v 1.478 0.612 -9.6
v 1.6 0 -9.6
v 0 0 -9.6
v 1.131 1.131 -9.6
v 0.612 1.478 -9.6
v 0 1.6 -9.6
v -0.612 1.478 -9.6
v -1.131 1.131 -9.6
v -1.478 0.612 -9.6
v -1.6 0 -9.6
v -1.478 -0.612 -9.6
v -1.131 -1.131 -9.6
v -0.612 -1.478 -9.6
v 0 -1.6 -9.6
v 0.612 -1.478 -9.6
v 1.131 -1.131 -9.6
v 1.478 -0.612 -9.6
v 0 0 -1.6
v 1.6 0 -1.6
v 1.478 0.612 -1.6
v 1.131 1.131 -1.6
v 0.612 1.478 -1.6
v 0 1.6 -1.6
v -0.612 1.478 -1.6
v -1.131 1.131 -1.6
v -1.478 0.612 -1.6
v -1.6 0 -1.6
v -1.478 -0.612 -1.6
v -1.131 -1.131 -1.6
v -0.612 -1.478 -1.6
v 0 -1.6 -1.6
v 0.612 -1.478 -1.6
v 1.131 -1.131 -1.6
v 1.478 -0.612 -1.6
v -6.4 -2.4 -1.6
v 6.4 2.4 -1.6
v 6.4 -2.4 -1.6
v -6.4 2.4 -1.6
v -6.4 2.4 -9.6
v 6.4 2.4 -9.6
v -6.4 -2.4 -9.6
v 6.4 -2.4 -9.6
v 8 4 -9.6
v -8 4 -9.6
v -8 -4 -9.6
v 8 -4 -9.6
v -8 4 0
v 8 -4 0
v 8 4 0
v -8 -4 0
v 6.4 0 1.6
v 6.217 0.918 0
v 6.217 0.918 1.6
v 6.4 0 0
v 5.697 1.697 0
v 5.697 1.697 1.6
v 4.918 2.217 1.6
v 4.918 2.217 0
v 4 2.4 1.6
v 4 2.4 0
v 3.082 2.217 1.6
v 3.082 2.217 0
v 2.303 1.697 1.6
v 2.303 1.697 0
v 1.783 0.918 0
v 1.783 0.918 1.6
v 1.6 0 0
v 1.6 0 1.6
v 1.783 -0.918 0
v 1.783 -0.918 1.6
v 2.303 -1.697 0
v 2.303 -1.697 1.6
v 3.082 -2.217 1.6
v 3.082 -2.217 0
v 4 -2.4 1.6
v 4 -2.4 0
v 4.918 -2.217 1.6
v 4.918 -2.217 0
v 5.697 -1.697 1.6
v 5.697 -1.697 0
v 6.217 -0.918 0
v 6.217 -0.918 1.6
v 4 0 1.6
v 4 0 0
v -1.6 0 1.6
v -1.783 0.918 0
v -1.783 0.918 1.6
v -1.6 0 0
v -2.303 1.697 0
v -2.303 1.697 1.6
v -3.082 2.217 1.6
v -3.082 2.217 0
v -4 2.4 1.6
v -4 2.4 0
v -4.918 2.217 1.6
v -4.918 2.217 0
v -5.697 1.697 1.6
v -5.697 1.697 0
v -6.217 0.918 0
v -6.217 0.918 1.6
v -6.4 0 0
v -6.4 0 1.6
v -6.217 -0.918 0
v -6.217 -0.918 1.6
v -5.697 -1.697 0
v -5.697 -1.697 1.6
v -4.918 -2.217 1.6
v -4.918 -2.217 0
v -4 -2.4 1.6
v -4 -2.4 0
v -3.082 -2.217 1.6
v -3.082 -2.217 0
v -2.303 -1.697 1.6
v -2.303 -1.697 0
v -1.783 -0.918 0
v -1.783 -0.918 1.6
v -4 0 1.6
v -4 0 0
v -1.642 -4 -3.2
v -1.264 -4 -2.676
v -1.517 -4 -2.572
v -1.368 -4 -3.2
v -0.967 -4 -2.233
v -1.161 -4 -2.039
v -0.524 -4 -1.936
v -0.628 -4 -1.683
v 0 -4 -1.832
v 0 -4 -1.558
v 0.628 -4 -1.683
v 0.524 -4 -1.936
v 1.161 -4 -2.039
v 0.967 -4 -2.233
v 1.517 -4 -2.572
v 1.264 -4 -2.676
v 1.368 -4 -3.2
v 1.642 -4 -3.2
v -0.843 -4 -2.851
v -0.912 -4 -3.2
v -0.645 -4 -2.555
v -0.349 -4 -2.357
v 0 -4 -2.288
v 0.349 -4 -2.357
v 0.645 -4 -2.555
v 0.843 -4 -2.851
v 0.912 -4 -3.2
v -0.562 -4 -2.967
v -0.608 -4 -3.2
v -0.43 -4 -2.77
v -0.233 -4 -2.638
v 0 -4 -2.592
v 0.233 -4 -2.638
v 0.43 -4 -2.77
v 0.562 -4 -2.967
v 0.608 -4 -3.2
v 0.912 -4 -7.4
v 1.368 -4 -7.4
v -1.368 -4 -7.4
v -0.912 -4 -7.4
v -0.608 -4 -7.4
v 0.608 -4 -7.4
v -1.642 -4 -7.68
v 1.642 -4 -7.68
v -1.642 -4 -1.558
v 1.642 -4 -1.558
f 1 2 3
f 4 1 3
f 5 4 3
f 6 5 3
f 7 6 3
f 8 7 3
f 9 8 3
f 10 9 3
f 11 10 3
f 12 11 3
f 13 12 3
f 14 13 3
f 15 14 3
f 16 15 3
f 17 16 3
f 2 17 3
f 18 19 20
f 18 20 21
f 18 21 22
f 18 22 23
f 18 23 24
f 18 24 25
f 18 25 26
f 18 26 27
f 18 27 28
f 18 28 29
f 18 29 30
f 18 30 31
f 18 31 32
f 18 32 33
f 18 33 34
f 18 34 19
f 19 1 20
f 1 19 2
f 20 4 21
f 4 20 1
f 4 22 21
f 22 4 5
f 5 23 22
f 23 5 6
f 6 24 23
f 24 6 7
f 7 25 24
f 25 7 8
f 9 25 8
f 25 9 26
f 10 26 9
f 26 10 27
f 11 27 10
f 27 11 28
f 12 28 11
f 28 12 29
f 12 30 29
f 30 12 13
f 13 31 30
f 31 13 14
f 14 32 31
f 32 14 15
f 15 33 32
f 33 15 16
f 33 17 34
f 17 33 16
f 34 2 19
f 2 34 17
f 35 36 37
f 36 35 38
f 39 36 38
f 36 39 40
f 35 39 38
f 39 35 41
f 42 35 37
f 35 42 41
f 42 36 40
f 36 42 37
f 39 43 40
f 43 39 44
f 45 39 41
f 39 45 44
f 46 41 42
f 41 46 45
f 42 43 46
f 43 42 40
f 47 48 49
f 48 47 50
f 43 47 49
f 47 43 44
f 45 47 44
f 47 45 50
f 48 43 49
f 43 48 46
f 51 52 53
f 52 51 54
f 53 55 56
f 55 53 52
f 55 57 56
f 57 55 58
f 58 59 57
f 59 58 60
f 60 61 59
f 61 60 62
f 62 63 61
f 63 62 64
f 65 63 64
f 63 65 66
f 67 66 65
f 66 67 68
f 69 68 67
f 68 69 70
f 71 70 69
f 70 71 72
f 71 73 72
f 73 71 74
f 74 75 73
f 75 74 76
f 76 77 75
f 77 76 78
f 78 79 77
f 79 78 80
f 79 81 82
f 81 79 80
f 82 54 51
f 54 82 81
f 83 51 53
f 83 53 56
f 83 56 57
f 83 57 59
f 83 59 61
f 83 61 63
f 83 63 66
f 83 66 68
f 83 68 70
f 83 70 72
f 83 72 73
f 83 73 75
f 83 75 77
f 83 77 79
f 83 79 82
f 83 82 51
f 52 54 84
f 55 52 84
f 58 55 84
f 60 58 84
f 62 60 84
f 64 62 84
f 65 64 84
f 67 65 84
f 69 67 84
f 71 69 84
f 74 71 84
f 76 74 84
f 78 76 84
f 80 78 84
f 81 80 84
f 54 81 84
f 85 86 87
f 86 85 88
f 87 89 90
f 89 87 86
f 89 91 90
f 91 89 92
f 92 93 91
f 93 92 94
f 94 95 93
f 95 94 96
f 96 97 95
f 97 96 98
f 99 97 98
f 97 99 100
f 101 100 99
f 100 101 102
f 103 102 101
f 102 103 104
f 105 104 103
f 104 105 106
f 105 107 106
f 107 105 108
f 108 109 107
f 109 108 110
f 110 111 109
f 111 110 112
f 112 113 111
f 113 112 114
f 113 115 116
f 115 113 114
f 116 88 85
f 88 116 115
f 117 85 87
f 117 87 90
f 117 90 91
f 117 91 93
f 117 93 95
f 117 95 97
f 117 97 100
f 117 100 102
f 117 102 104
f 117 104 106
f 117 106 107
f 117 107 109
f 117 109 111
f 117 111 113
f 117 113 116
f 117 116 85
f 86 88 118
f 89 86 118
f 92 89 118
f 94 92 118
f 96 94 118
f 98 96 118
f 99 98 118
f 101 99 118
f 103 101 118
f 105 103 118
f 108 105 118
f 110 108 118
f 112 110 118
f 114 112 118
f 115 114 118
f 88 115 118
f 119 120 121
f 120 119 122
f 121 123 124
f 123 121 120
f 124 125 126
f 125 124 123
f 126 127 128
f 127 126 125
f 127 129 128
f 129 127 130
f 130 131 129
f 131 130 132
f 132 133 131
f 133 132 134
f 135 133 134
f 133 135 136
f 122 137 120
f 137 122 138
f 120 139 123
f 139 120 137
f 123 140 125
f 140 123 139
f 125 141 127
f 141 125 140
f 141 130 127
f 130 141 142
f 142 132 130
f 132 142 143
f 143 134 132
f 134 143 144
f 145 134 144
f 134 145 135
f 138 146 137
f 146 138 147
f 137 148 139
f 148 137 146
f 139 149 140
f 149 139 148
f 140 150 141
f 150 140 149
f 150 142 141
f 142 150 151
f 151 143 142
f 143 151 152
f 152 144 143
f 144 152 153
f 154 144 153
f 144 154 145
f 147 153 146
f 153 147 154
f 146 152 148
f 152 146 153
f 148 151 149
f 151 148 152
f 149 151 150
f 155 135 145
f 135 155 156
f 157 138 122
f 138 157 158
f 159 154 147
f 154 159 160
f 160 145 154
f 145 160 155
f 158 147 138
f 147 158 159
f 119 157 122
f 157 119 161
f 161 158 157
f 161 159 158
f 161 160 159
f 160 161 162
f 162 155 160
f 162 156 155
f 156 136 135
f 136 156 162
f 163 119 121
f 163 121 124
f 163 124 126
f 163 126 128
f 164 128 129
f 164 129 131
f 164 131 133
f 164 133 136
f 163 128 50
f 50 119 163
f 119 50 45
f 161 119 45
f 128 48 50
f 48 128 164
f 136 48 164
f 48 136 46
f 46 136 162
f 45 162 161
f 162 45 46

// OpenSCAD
// file: ../p/4-4edge.scad
use <../lib.scad>
function ldraw_lib__4_4edge() = [
// 0 Circle 1.0
// 0 Name: 4-4edge.dat
// 0 Author: James Jessiman
// 0 !LDRAW_ORG Primitive UPDATE 2017-01
// 0 !LICENSE Licensed under CC BY 2.0 and CC BY 4.0 : see CAreadme.txt
// 
// 0 BFC CERTIFY CCW
  [0,"BFC","CERTIFY"],
  [0,"BFC","CCW"],
// 
// 0 !HISTORY 1998-12-15 [PTadmin] Official Update 1998-10
// 0 !HISTORY 2005-12-28 [PTadmin] Official Update 2005-01
// 0 !HISTORY 2007-06-24 [PTadmin] Header formatted for Contributor Agreement
// 0 !HISTORY 2008-07-01 [PTadmin] Official Update 2008-01
// 0 !HISTORY 2017-01-15 [Steffen] BFCed
// 0 !HISTORY 2017-12-30 [PTadmin] Official Update 2017-01
// 
// 
// 2 24 1 0 0 0.9239 0 0.3827
  [2,24,1,0,0,0.9239,0,0.3827],
// 2 24 0.9239 0 0.3827 0.7071 0 0.7071
  [2,24,0.9239,0,0.3827,0.7071,0,0.7071],
// 2 24 0.7071 0 0.7071 0.3827 0 0.9239
  [2,24,0.7071,0,0.7071,0.3827,0,0.9239],
// 2 24 0.3827 0 0.9239 0 0 1
  [2,24,0.3827,0,0.9239,0,0,1],
// 2 24 0 0 1 -0.3827 0 0.9239
  [2,24,0,0,1,-0.3827,0,0.9239],
// 2 24 -0.3827 0 0.9239 -0.7071 0 0.7071
  [2,24,-0.3827,0,0.9239,-0.7071,0,0.7071],
// 2 24 -0.7071 0 0.7071 -0.9239 0 0.3827
  [2,24,-0.7071,0,0.7071,-0.9239,0,0.3827],
// 2 24 -0.9239 0 0.3827 -1 0 -0
  [2,24,-0.9239,0,0.3827,-1,0,-0],
// 2 24 -1 0 -0 -0.9239 0 -0.3827
  [2,24,-1,0,-0,-0.9239,0,-0.3827],
// 2 24 -0.9239 0 -0.3827 -0.7071 0 -0.7071
  [2,24,-0.9239,0,-0.3827,-0.7071,0,-0.7071],
// 2 24 -0.7071 0 -0.7071 -0.3827 0 -0.9239
  [2,24,-0.7071,0,-0.7071,-0.3827,0,-0.9239],
// 2 24 -0.3827 0 -0.9239 0 0 -1
  [2,24,-0.3827,0,-0.9239,0,0,-1],
// 2 24 0 0 -1 0.3827 0 -0.9239
  [2,24,0,0,-1,0.3827,0,-0.9239],
// 2 24 0.3827 0 -0.9239 0.7071 0 -0.7071
  [2,24,0.3827,0,-0.9239,0.7071,0,-0.7071],
// 2 24 0.7071 0 -0.7071 0.9239 0 -0.3827
  [2,24,0.7071,0,-0.7071,0.9239,0,-0.3827],
// 2 24 0.9239 0 -0.3827 1 0 0
  [2,24,0.9239,0,-0.3827,1,0,0],
];
module ldraw_lib__4_4edge(step=0, col=false, unit=2/5, alt=false, line=0.2, solid=!$preview)
    makepoly(ldraw_lib__4_4edge(), step=step, col=col, unit=unit, alt=alt, line=line, solid=solid);
ldraw_lib__4_4edge(line=0.2);
// file: ../p/4-4disc.scad
use <../lib.scad>
function ldraw_lib__4_4disc() = [
// 0 Disc 1.0
// 0 Name: 4-4disc.dat
// 0 Author: James Jessiman
// 0 !LDRAW_ORG Primitive UPDATE 2002-02
// 0 !LICENSE Licensed under CC BY 2.0 and CC BY 4.0 : see CAreadme.txt
// 
// 0 BFC CERTIFY CCW
  [0,"BFC","CERTIFY"],
  [0,"BFC","CCW"],
// 
// 0 !HISTORY 1998-12-15 [PTadmin] Official Update 1998-10
// 0 !HISTORY 2002-03-23 [sbliss] Added BFC statement
// 0 !HISTORY 2002-04-25 [PTadmin] Official Update 2002-02
// 0 !HISTORY 2007-06-24 [PTadmin] Header formatted for Contributor Agreement
// 0 !HISTORY 2008-07-01 [PTadmin] Official Update 2008-01
// 
// 
// 3 16 0 0 0 1 0 0 0.9239 0 0.3827
  [3,16,0,0,0,1,0,0,0.9239,0,0.3827],
// 3 16 0 0 0 0.9239 0 0.3827 0.7071 0 0.7071
  [3,16,0,0,0,0.9239,0,0.3827,0.7071,0,0.7071],
// 3 16 0 0 0 0.7071 0 0.7071 0.3827 0 0.9239
  [3,16,0,0,0,0.7071,0,0.7071,0.3827,0,0.9239],
// 3 16 0 0 0 0.3827 0 0.9239 0 0 1
  [3,16,0,0,0,0.3827,0,0.9239,0,0,1],
// 3 16 0 0 0 0 0 1 -0.3827 0 0.9239
  [3,16,0,0,0,0,0,1,-0.3827,0,0.9239],
// 3 16 0 0 0 -0.3827 0 0.9239 -0.7071 0 0.7071
  [3,16,0,0,0,-0.3827,0,0.9239,-0.7071,0,0.7071],
// 3 16 0 0 0 -0.7071 0 0.7071 -0.9239 0 0.3827
  [3,16,0,0,0,-0.7071,0,0.7071,-0.9239,0,0.3827],
// 3 16 0 0 0 -0.9239 0 0.3827 -1 0 -0
  [3,16,0,0,0,-0.9239,0,0.3827,-1,0,-0],
// 3 16 0 0 0 -1 0 -0 -0.9239 0 -0.3827
  [3,16,0,0,0,-1,0,-0,-0.9239,0,-0.3827],
// 3 16 0 0 0 -0.9239 0 -0.3827 -0.7071 0 -0.7071
  [3,16,0,0,0,-0.9239,0,-0.3827,-0.7071,0,-0.7071],
// 3 16 0 0 0 -0.7071 0 -0.7071 -0.3827 0 -0.9239
  [3,16,0,0,0,-0.7071,0,-0.7071,-0.3827,0,-0.9239],
// 3 16 0 0 0 -0.3827 0 -0.9239 0 0 -1
  [3,16,0,0,0,-0.3827,0,-0.9239,0,0,-1],
// 3 16 0 0 0 0 0 -1 0.3827 0 -0.9239
  [3,16,0,0,0,0,0,-1,0.3827,0,-0.9239],
// 3 16 0 0 0 0.3827 0 -0.9239 0.7071 0 -0.7071
  [3,16,0,0,0,0.3827,0,-0.9239,0.7071,0,-0.7071],
// 3 16 0 0 0 0.7071 0 -0.7071 0.9239 0 -0.3827
  [3,16,0,0,0,0.7071,0,-0.7071,0.9239,0,-0.3827],
// 3 16 0 0 0 0.9239 0 -0.3827 1 0 0
  [3,16,0,0,0,0.9239,0,-0.3827,1,0,0],
// 0
];
module ldraw_lib__4_4disc(step=0, col=false, unit=2/5, alt=false, line=0.2, solid=!$preview)
    makepoly(ldraw_lib__4_4disc(), step=step, col=col, unit=unit, alt=alt, line=line, solid=solid);
ldraw_lib__4_4disc(line=0.2);
// file: ../p/4-4cyli.scad
use <../lib.scad>
$fa=1; $fs=0.2;
function ldraw_lib__4_4cyli(realsolid=false) = [
// 0 Cylinder 1.0
// 0 Name: 4-4cyli.dat
// 0 Author: James Jessiman
// 0 !LDRAW_ORG Primitive UPDATE 2005-01
// 0 !LICENSE Licensed under CC BY 2.0 and CC BY 4.0 : see CAreadme.txt
// 
// 0 BFC CERTIFY CCW
  [0,"BFC","CERTIFY"],
  [0,"BFC","CCW"],
// 
// 0 !HISTORY 1998-12-15 [PTadmin] Official Update 1998-10
// 0 !HISTORY 2002-03-23 [sbliss] Added BFC statement; merged headers from files in distributions LDraw 0.27 and Complete.
// 0 !HISTORY 2002-04-25 [PTadmin] Official Update 2002-02
// 0 !HISTORY 2004-12-14 [guyvivan] BFC CCW
// 0 !HISTORY 2005-12-28 [PTadmin] Official Update 2005-01
// 0 !HISTORY 2007-06-24 [PTadmin] Header formatted for Contributor Agreement
// 0 !HISTORY 2008-07-01 [PTadmin] Official Update 2008-01
// 
// 
// 4 16 1 1 0 0.9239 1 0.3827 0.9239 0 0.3827 1 0 0
  [4,16,1,1,0,0.9239,1,0.3827,0.9239,0,0.3827,1,0,0],
// 5 24 1 0 0 1 1 0 0.9239 0 0.3827 0.9239 0 -0.3827
  [5,24,1,0,0,1,1,0,0.9239,0,0.3827,0.9239,0,-0.3827],
// 4 16 0.9239 1 0.3827 0.7071 1 0.7071 0.7071 0 0.7071 0.9239 0 0.3827
  [4,16,0.9239,1,0.3827,0.7071,1,0.7071,0.7071,0,0.7071,0.9239,0,0.3827],
// 5 24 0.9239 0 0.3827 0.9239 1 0.3827 0.7071 0 0.7071 1 0 0
  [5,24,0.9239,0,0.3827,0.9239,1,0.3827,0.7071,0,0.7071,1,0,0],
// 4 16 0.7071 1 0.7071 0.3827 1 0.9239 0.3827 0 0.9239 0.7071 0 0.7071
  [4,16,0.7071,1,0.7071,0.3827,1,0.9239,0.3827,0,0.9239,0.7071,0,0.7071],
// 5 24 0.7071 0 0.7071 0.7071 1 0.7071 0.3827 0 0.9239 0.9239 0 0.3827
  [5,24,0.7071,0,0.7071,0.7071,1,0.7071,0.3827,0,0.9239,0.9239,0,0.3827],
// 4 16 0.3827 1 0.9239 0 1 1 0 0 1 0.3827 0 0.9239
  [4,16,0.3827,1,0.9239,0,1,1,0,0,1,0.3827,0,0.9239],
// 5 24 0.3827 0 0.9239 0.3827 1 0.9239 0 0 1 0.7071 0 0.7071
  [5,24,0.3827,0,0.9239,0.3827,1,0.9239,0,0,1,0.7071,0,0.7071],
// 4 16 0 1 1 -0.3827 1 0.9239 -0.3827 0 0.9239 0 0 1
  [4,16,0,1,1,-0.3827,1,0.9239,-0.3827,0,0.9239,0,0,1],
// 5 24 0 0 1 0 1 1 -0.3827 0 0.9239 0.3827 0 0.9239
  [5,24,0,0,1,0,1,1,-0.3827,0,0.9239,0.3827,0,0.9239],
// 4 16 -0.3827 1 0.9239 -0.7071 1 0.7071 -0.7071 0 0.7071 -0.3827 0 0.9239
  [4,16,-0.3827,1,0.9239,-0.7071,1,0.7071,-0.7071,0,0.7071,-0.3827,0,0.9239],
// 5 24 -0.3827 0 0.9239 -0.3827 1 0.9239 -0.7071 0 0.7071 0 0 1
  [5,24,-0.3827,0,0.9239,-0.3827,1,0.9239,-0.7071,0,0.7071,0,0,1],
// 4 16 -0.7071 1 0.7071 -0.9239 1 0.3827 -0.9239 0 0.3827 -0.7071 0 0.7071
  [4,16,-0.7071,1,0.7071,-0.9239,1,0.3827,-0.9239,0,0.3827,-0.7071,0,0.7071],
// 5 24 -0.7071 0 0.7071 -0.7071 1 0.7071 -0.9239 0 0.3827 -0.3827 0 0.9239
  [5,24,-0.7071,0,0.7071,-0.7071,1,0.7071,-0.9239,0,0.3827,-0.3827,0,0.9239],
// 4 16 -0.9239 1 0.3827 -1 1 0 -1 0 0 -0.9239 0 0.3827
  [4,16,-0.9239,1,0.3827,-1,1,0,-1,0,0,-0.9239,0,0.3827],
// 5 24 -0.9239 0 0.3827 -0.9239 1 0.3827 -1 0 0 -0.7071 0 0.7071
  [5,24,-0.9239,0,0.3827,-0.9239,1,0.3827,-1,0,0,-0.7071,0,0.7071],
// 4 16 -1 1 0 -0.9239 1 -0.3827 -0.9239 0 -0.3827 -1 0 0
  [4,16,-1,1,0,-0.9239,1,-0.3827,-0.9239,0,-0.3827,-1,0,0],
// 5 24 -1 0 0 -1 1 0 -0.9239 0 -0.3827 -0.9239 0 0.3827
  [5,24,-1,0,0,-1,1,0,-0.9239,0,-0.3827,-0.9239,0,0.3827],
// 4 16 -0.9239 1 -0.3827 -0.7071 1 -0.7071 -0.7071 0 -0.7071 -0.9239 0 -0.3827
  [4,16,-0.9239,1,-0.3827,-0.7071,1,-0.7071,-0.7071,0,-0.7071,-0.9239,0,-0.3827],
// 5 24 -0.9239 0 -0.3827 -0.9239 1 -0.3827 -0.7071 0 -0.7071 -1 0 0
  [5,24,-0.9239,0,-0.3827,-0.9239,1,-0.3827,-0.7071,0,-0.7071,-1,0,0],
// 4 16 -0.7071 1 -0.7071 -0.3827 1 -0.9239 -0.3827 0 -0.9239 -0.7071 0 -0.7071
  [4,16,-0.7071,1,-0.7071,-0.3827,1,-0.9239,-0.3827,0,-0.9239,-0.7071,0,-0.7071],
// 5 24 -0.7071 0 -0.7071 -0.7071 1 -0.7071 -0.3827 0 -0.9239 -0.9239 0 -0.3827
  [5,24,-0.7071,0,-0.7071,-0.7071,1,-0.7071,-0.3827,0,-0.9239,-0.9239,0,-0.3827],
// 4 16 -0.3827 1 -0.9239 0 1 -1 0 0 -1 -0.3827 0 -0.9239
  [4,16,-0.3827,1,-0.9239,0,1,-1,0,0,-1,-0.3827,0,-0.9239],
// 5 24 -0.3827 0 -0.9239 -0.3827 1 -0.9239 0 0 -1 -0.7071 0 -0.7071
  [5,24,-0.3827,0,-0.9239,-0.3827,1,-0.9239,0,0,-1,-0.7071,0,-0.7071],
// 4 16 0 1 -1 0.3827 1 -0.9239 0.3827 0 -0.9239 0 0 -1
  [4,16,0,1,-1,0.3827,1,-0.9239,0.3827,0,-0.9239,0,0,-1],
// 5 24 0 0 -1 0 1 -1 0.3827 0 -0.9239 -0.3827 0 -0.9239
  [5,24,0,0,-1,0,1,-1,0.3827,0,-0.9239,-0.3827,0,-0.9239],
// 4 16 0.3827 1 -0.9239 0.7071 1 -0.7071 0.7071 0 -0.7071 0.3827 0 -0.9239
  [4,16,0.3827,1,-0.9239,0.7071,1,-0.7071,0.7071,0,-0.7071,0.3827,0,-0.9239],
// 5 24 0.3827 0 -0.9239 0.3827 1 -0.9239 0.7071 0 -0.7071 0 0 -1
  [5,24,0.3827,0,-0.9239,0.3827,1,-0.9239,0.7071,0,-0.7071,0,0,-1],
// 4 16 0.7071 1 -0.7071 0.9239 1 -0.3827 0.9239 0 -0.3827 0.7071 0 -0.7071
  [4,16,0.7071,1,-0.7071,0.9239,1,-0.3827,0.9239,0,-0.3827,0.7071,0,-0.7071],
// 5 24 0.7071 0 -0.7071 0.7071 1 -0.7071 0.9239 0 -0.3827 0.3827 0 -0.9239
  [5,24,0.7071,0,-0.7071,0.7071,1,-0.7071,0.9239,0,-0.3827,0.3827,0,-0.9239],
// 4 16 0.9239 1 -0.3827 1 1 0 1 0 0 0.9239 0 -0.3827
  [4,16,0.9239,1,-0.3827,1,1,0,1,0,0,0.9239,0,-0.3827],
// 5 24 0.9239 0 -0.3827 0.9239 1 -0.3827 1 0 0 0.7071 0 -0.7071
  [5,24,0.9239,0,-0.3827,0.9239,1,-0.3827,1,0,0,0.7071,0,-0.7071],
// 0
];
module ldraw_lib__4_4cyli(step=0, col=false, unit=2/5, alt=false, line=0.2, solid=!$preview)
    makepoly(ldraw_lib__4_4cyli(solid), step=step, col=col, unit=unit, alt=alt, line=line, solid=solid);
ldraw_lib__4_4cyli(line=0.2);
// file: ../p/stud3.scad
use <../lib.scad>
use <4-4cyli.scad>
use <4-4disc.scad>
use <4-4edge.scad>
function ldraw_lib__stud3() = [
// 0 Stud Tube Solid
// 0 Name: stud3.dat
// 0 Author: James Jessiman
// 0 !LDRAW_ORG Primitive UPDATE 2012-01
// 0 !LICENSE Licensed under CC BY 4.0 : see CAreadme.txt
// 
// 0 BFC CERTIFY CCW
  [0,"BFC","CERTIFY"],
  [0,"BFC","CCW"],
// 
// 0 !HISTORY 2002-04-04 [sbliss] Modified for BFC compliance
// 0 !HISTORY 2002-04-25 [PTadmin] Official Update 2002-02
// 0 !HISTORY 2007-06-24 [PTadmin] Header formatted for Contributor Agreement
// 0 !HISTORY 2008-07-01 [PTadmin] Official Update 2008-01
// 0 !HISTORY 2012-02-16 [Philo] Changed to CCW
// 0 !HISTORY 2012-03-30 [PTadmin] Official Update 2012-01
// 
// 
// 1 16 0 -4 0 4 0 0 0 1 0 0 0 4 4-4edge.dat
  [1,16,0,-4,0,4,0,0,0,1,0,0,0,4, ldraw_lib__4_4edge()],
// 1 16 0 0 0 4 0 0 0 1 0 0 0 4 4-4edge.dat
  [1,16,0,0,0,4,0,0,0,1,0,0,0,4, ldraw_lib__4_4edge()],
// 1 16 0 -4 0 4 0 0 0 1 0 0 0 4 4-4disc.dat
  [1,16,0,-4,0,4,0,0,0,1,0,0,0,4, ldraw_lib__4_4disc()],
  [-1,16,0,0,0,4,0,0,0,-1,0,0,0,4, ldraw_lib__4_4disc()],
// 1 16 0 -4 0 4 0 0 0 4 0 0 0 4 4-4cyli.dat
  [1,16,0,-4,0,4,0,0,0,4,0,0,0,4, ldraw_lib__4_4cyli()],
];
module ldraw_lib__stud3(step=0, col=false, unit=2/5, alt=false, line=0.2, solid=!$preview)
    makepoly(ldraw_lib__stud3(), step=step, col=col, unit=unit, alt=alt, line=line, solid=solid);
ldraw_lib__stud3(line=0.2);
// file: ../p/stud.scad
use <../lib.scad>
use <4-4cyli.scad>
use <4-4disc.scad>
use <4-4edge.scad>
function ldraw_lib__stud() = [
// 0 Stud
// 0 Name: stud.dat
// 0 Author: James Jessiman
// 0 !LDRAW_ORG Primitive UPDATE 2012-01
// 0 !LICENSE Licensed under CC BY 4.0 : see CAreadme.txt
// 
// 0 BFC CERTIFY CCW
  [0,"BFC","CERTIFY"],
  [0,"BFC","CCW"],
// 
// 0 !HISTORY 2002-04-04 [sbliss] Modified for BFC compliance
// 0 !HISTORY 2002-04-25 [PTadmin] Official Update 2002-02
// 0 !HISTORY 2007-06-24 [PTadmin] Header formatted for Contributor Agreement
// 0 !HISTORY 2008-07-01 [PTadmin] Official Update 2008-01
// 0 !HISTORY 2012-02-16 [Philo] Changed to CCW
// 0 !HISTORY 2012-03-30 [PTadmin] Official Update 2012-01
// 
// 
// 1 16 0 0 0 6 0 0 0 1 0 0 0 6 4-4edge.dat
  [1,16,0,0,0,6,0,0,0,1,0,0,0,6, ldraw_lib__4_4edge()],
// 1 16 0 -4 0 6 0 0 0 1 0 0 0 6 4-4edge.dat
  [1,16,0,-4,0,6,0,0,0,1,0,0,0,6, ldraw_lib__4_4edge()],
// 1 16 0 0 0 6 0 0 0 -4 0 0 0 6 4-4cyli.dat
  [1,16,0,0,0,6,0,0,0,-4,0,0,0,6, ldraw_lib__4_4cyli()],
// 1 16 0 -4 0 6 0 0 0 1 0 0 0 6 4-4disc.dat
  [1,16,0,-4,0,6,0,0,0,1,0,0,0,6, ldraw_lib__4_4disc()],
  [-1,16,0,0,0,6,0,0,0,-1,0,0,0,6, ldraw_lib__4_4disc()],
];
module ldraw_lib__stud(step=0, col=false, unit=2/5, alt=false, line=0.2, solid=!$preview)
    makepoly(ldraw_lib__stud(), step=step, col=col, unit=unit, alt=alt, line=line, solid=solid);
ldraw_lib__stud(line=0.2);
// file: ../p/box5.scad
use <../lib.scad>
function ldraw_lib__box5() = [
// 0 Box with 5 Faces and All Edges
// 0 Name: box5.dat
// 0 Author: James Jessiman
// 0 !LDRAW_ORG Primitive UPDATE 2012-01
// 0 !LICENSE Licensed under CC BY 2.0 and CC BY 4.0 : see CAreadme.txt
// 
// 0 BFC CERTIFY CCW
  [0,"BFC","CERTIFY"],
  [0,"BFC","CCW"],
// 
// 0 !HISTORY 2002-04-03 [sbliss] Modified for BFC compliance
// 0 !HISTORY 2002-04-25 [PTadmin] Official Update 2002-02
// 0 !HISTORY 2007-06-24 [PTadmin] Header formatted for Contributor Agreement
// 0 !HISTORY 2008-07-01 [PTadmin] Official Update 2008-01
// 0 !HISTORY 2012-02-16 [Philo] Changed to CCW
// 0 !HISTORY 2012-03-30 [PTadmin] Official Update 2012-01
// 
// 
// 2 24 1 1 1 -1 1 1
  [2,24,1,1,1,-1,1,1],
// 2 24 -1 1 1 -1 1 -1
  [2,24,-1,1,1,-1,1,-1],
// 2 24 -1 1 -1 1 1 -1
  [2,24,-1,1,-1,1,1,-1],
// 2 24 1 1 -1 1 1 1
  [2,24,1,1,-1,1,1,1],
// 2 24 1 0 1 -1 0 1
  [2,24,1,0,1,-1,0,1],
// 2 24 -1 0 1 -1 0 -1
  [2,24,-1,0,1,-1,0,-1],
// 2 24 -1 0 -1 1 0 -1
  [2,24,-1,0,-1,1,0,-1],
// 2 24 1 0 -1 1 0 1
  [2,24,1,0,-1,1,0,1],
// 2 24 1 0 1 1 1 1
  [2,24,1,0,1,1,1,1],
// 2 24 -1 0 1 -1 1 1
  [2,24,-1,0,1,-1,1,1],
// 2 24 1 0 -1 1 1 -1
  [2,24,1,0,-1,1,1,-1],
// 2 24 -1 0 -1 -1 1 -1
  [2,24,-1,0,-1,-1,1,-1],
// 4 16 -1 1 1 1 1 1 1 1 -1 -1 1 -1
  [4,16,-1,1,1,1,1,1,1,1,-1,-1,1,-1],
// 4 16 -1 1 1 -1 0 1 1 0 1 1 1 1
  [4,16,-1,1,1,-1,0,1,1,0,1,1,1,1],
// 4 16 -1 1 -1 -1 0 -1 -1 0 1 -1 1 1
  [4,16,-1,1,-1,-1,0,-1,-1,0,1,-1,1,1],
// 4 16 1 1 -1 1 0 -1 -1 0 -1 -1 1 -1
  [4,16,1,1,-1,1,0,-1,-1,0,-1,-1,1,-1],
// 4 16 1 1 1 1 0 1 1 0 -1 1 1 -1
  [4,16,1,1,1,1,0,1,1,0,-1,1,1,-1],
];
makepoly(ldraw_lib__box5(), line=0.2);
// file: ../p/box4t.scad
use <../lib.scad>
function ldraw_lib__box4t() = [
// 0 Box with 4 Adjacent Faces and All Edges
// 0 Name: box4t.dat
// 0 Author: Tore Eriksson [Tore_Eriksson]
// 0 !LDRAW_ORG Primitive UPDATE 2003-02
// 0 !LICENSE Licensed under CC BY 2.0 and CC BY 4.0 : see CAreadme.txt
// 
// 0 BFC CERTIFY CCW
  [0,"BFC","CERTIFY"],
  [0,"BFC","CCW"],
// 
// 0 !HISTORY 1997-09-29 [PTadmin] Official Update 1997-15
// 0 !HISTORY 2002-08-31 [izanette] Modified with WINDZ for BFC compliance
// 0 !HISTORY 2003-08-01 [PTadmin] Official Update 2003-02
// 0 !HISTORY 2007-06-24 [PTadmin] Header formatted for Contributor Agreement
// 0 !HISTORY 2008-07-01 [PTadmin] Official Update 2008-01
// 
// 
// 2 24 1 1 1 -1 1 1
  [2,24,1,1,1,-1,1,1],
// 2 24 -1 1 1 -1 1 -1
  [2,24,-1,1,1,-1,1,-1],
// 2 24 -1 1 -1 1 1 -1
  [2,24,-1,1,-1,1,1,-1],
// 2 24 1 1 -1 1 1 1
  [2,24,1,1,-1,1,1,1],
// 2 24 1 0 1 -1 0 1
  [2,24,1,0,1,-1,0,1],
// 2 24 -1 0 1 -1 0 -1
  [2,24,-1,0,1,-1,0,-1],
// 2 24 -1 0 -1 1 0 -1
  [2,24,-1,0,-1,1,0,-1],
// 2 24 1 0 -1 1 0 1
  [2,24,1,0,-1,1,0,1],
// 2 24 1 0 1 1 1 1
  [2,24,1,0,1,1,1,1],
// 2 24 -1 0 1 -1 1 1
  [2,24,-1,0,1,-1,1,1],
// 2 24 1 0 -1 1 1 -1
  [2,24,1,0,-1,1,1,-1],
// 2 24 -1 0 -1 -1 1 -1
  [2,24,-1,0,-1,-1,1,-1],
// 4 16 1 1 1 1 1 -1 -1 1 -1 -1 1 1
  [4,16,1,1,1,1,1,-1,-1,1,-1,-1,1,1],
// 4 16 1 1 1 -1 1 1 -1 0 1 1 0 1
  [4,16,1,1,1,-1,1,1,-1,0,1,1,0,1],
// 4 16 -1 1 1 -1 1 -1 -1 0 -1 -1 0 1
  [4,16,-1,1,1,-1,1,-1,-1,0,-1,-1,0,1],
// 0 4 16 -1 1 -1 -1 0 -1 1 0 -1 1 1 -1
// 4 16 1 1 -1 1 1 1 1 0 1 1 0 -1
  [4,16,1,1,-1,1,1,1,1,0,1,1,0,-1],
// 0
];
makepoly(ldraw_lib__box4t(), line=0.2);
// file: s/3004s01.scad
use <../../lib.scad>
use <../../p/box4t.scad>
use <../../p/box5.scad>
use <../../p/stud.scad>
use <../../p/stud3.scad>
$fa=1; $fs=0.2;
function ldraw_lib__s__3004s01(realsolid=false) = [
// 0 ~Brick  1 x  2 without Front Face
// 0 Name: s\3004s01.dat
// 0 Author: James Jessiman
// 0 !LDRAW_ORG Subpart UPDATE 2003-03
// 0 !LICENSE Licensed under CC BY 2.0 and CC BY 4.0 : see CAreadme.txt
// 
// 0 BFC CERTIFY CCW
  [0,"BFC","CERTIFY"],
  [0,"BFC","CCW"],
// 
// 0 !HISTORY 2003-09-07 [jriley] Subfiling, BFC
// 0 !HISTORY 2003-12-19 [PTadmin] Official Update 2003-03
// 0 !HISTORY 2007-08-29 [PTadmin] Header formatted for Contributor Agreement
// 0 !HISTORY 2008-07-01 [PTadmin] Official Update 2008-01
// 
// 
// 1 16 0 4 0 1 0 0 0 -5 0 0 0 1 stud3.dat
  [1,16,0,4,0,1,0,0,0,-5,0,0,0,1, ldraw_lib__stud3(realsolid)],
// 0 BFC INVERTNEXT
  [0,"BFC","INVERTNEXT"],
// 1 16 0 24 0 16 0 0 0 -20 0 0 0 6 box5.dat
  [1,16,0,24,0,16,0,0,0,-20,0,0,0,6, ldraw_lib__box5(realsolid)],
// 4 16 20 24 10 16 24 6 -16 24 6 -20 24 10
  [4,16,20,24,10,16,24,6,-16,24,6,-20,24,10],
// 4 16 -20 24 10 -16 24 6 -16 24 -6 -20 24 -10
  [4,16,-20,24,10,-16,24,6,-16,24,-6,-20,24,-10],
// 4 16 -20 24 -10 -16 24 -6 16 24 -6 20 24 -10
  [4,16,-20,24,-10,-16,24,-6,16,24,-6,20,24,-10],
// 4 16 20 24 -10 16 24 -6 16 24 6 20 24 10
  [4,16,20,24,-10,16,24,-6,16,24,6,20,24,10],
// 1 16 0 24 0 20 0 0 0 -24 0 0 0 10 box4t.dat
  [1,16,0,24,0,20,0,0,0,-24,0,0,0,10, ldraw_lib__box4t(realsolid)],
// 1 16 10 0 0 1 0 0 0 1 0 0 0 1 stud.dat
  [1,16,10,0,0,1,0,0,0,1,0,0,0,1, ldraw_lib__stud(realsolid)],
// 1 16 -10 0 0 1 0 0 0 1 0 0 0 1 stud.dat
  [1,16,-10,0,0,1,0,0,0,1,0,0,0,1, ldraw_lib__stud(realsolid)],
// 0
];
module ldraw_lib__s__3004s01(step=0, col=false, unit=2/5, alt=false, line=0.2, solid=!$preview)
    makepoly(ldraw_lib__s__3004s01(solid), step=step, col=col, unit=unit, alt=alt, line=line, solid=solid);
ldraw_lib__s__3004s01(line=0.2);
// file: ../p/2-4ring5.scad
use <../lib.scad>
function ldraw_lib__2_4ring5() = [
// 0 Ring  5 x 0.5
// 0 Name: 2-4ring5.dat
// 0 Author: George Barnes [glbarnes]
// 0 !LDRAW_ORG Primitive UPDATE 2012-01
// 0 !LICENSE Licensed under CC BY 2.0 and CC BY 4.0 : see CAreadme.txt
// 
// 0 BFC CERTIFY CCW
  [0,"BFC","CERTIFY"],
  [0,"BFC","CCW"],
// 
// 0 !HISTORY 2003-12-19 [PTadmin] Official Update 2003-03
// 0 !HISTORY 2007-06-24 [PTadmin] Header formatted for Contributor Agreement
// 0 !HISTORY 2008-07-01 [PTadmin] Official Update 2008-01
// 0 !HISTORY 2012-02-16 [Philo] Changed to CCW
// 0 !HISTORY 2012-03-30 [PTadmin] Official Update 2012-01
// 
// 
// 4 16 6 0 0 5.5434 0 2.2962 4.6195 0 1.9135 5 0 0
  [4,16,6,0,0,5.5434,0,2.2962,4.6195,0,1.9135,5,0,0],
// 4 16 5.5434 0 2.2962 4.2426 0 4.2426 3.5355 0 3.5355 4.6195 0 1.9135
  [4,16,5.5434,0,2.2962,4.2426,0,4.2426,3.5355,0,3.5355,4.6195,0,1.9135],
// 4 16 4.2426 0 4.2426 2.2962 0 5.5434 1.9135 0 4.6195 3.5355 0 3.5355
  [4,16,4.2426,0,4.2426,2.2962,0,5.5434,1.9135,0,4.6195,3.5355,0,3.5355],
// 4 16 2.2962 0 5.5434 0 0 6 0 0 5 1.9135 0 4.6195
  [4,16,2.2962,0,5.5434,0,0,6,0,0,5,1.9135,0,4.6195],
// 4 16 0 0 6 -2.2962 0 5.5434 -1.9135 0 4.6195 0 0 5
  [4,16,0,0,6,-2.2962,0,5.5434,-1.9135,0,4.6195,0,0,5],
// 4 16 -2.2962 0 5.5434 -4.2426 0 4.2426 -3.5355 0 3.5355 -1.9135 0 4.6195
  [4,16,-2.2962,0,5.5434,-4.2426,0,4.2426,-3.5355,0,3.5355,-1.9135,0,4.6195],
// 4 16 -4.2426 0 4.2426 -5.5434 0 2.2962 -4.6195 0 1.9135 -3.5355 0 3.5355
  [4,16,-4.2426,0,4.2426,-5.5434,0,2.2962,-4.6195,0,1.9135,-3.5355,0,3.5355],
// 4 16 -5.5434 0 2.2962 -6 0 0 -5 0 0 -4.6195 0 1.9135
  [4,16,-5.5434,0,2.2962,-6,0,0,-5,0,0,-4.6195,0,1.9135],
];
module ldraw_lib__2_4ring5(step=0, col=false, unit=2/5, alt=false, line=0.2, solid=!$preview)
    makepoly(ldraw_lib__2_4ring5(), step=step, col=col, unit=unit, alt=alt, line=line, solid=solid);
ldraw_lib__2_4ring5(line=0.2);
// file: ../p/2-4ring2.scad
use <../lib.scad>
function ldraw_lib__2_4ring2() = [
// 0 Ring  2 x 0.5
// 0 Name: 2-4ring2.dat
// 0 Author: Chris Dee [cwdee]
// 0 !LDRAW_ORG Primitive UPDATE 2012-01
// 0 !LICENSE Licensed under CC BY 2.0 and CC BY 4.0 : see CAreadme.txt
// 
// 0 BFC CERTIFY CCW
  [0,"BFC","CERTIFY"],
  [0,"BFC","CCW"],
// 
// 0 !HISTORY 2001-10-26 [PTadmin] Official Update 2001-01
// 0 !HISTORY 2007-06-24 [PTadmin] Header formatted for Contributor Agreement
// 0 !HISTORY 2008-07-01 [PTadmin] Official Update 2008-01
// 0 !HISTORY 2012-02-16 [Philo] Changed to CCW
// 0 !HISTORY 2012-03-30 [PTadmin] Official Update 2012-01
// 
// 
// 4 16 3 0 0 2.7717 0 1.1481 1.8478 0 0.7654 2 0 0
  [4,16,3,0,0,2.7717,0,1.1481,1.8478,0,0.7654,2,0,0],
// 4 16 2.7717 0 1.1481 2.1213 0 2.1213 1.4142 0 1.4142 1.8478 0 0.7654
  [4,16,2.7717,0,1.1481,2.1213,0,2.1213,1.4142,0,1.4142,1.8478,0,0.7654],
// 4 16 2.1213 0 2.1213 1.1481 0 2.7717 0.7654 0 1.8478 1.4142 0 1.4142
  [4,16,2.1213,0,2.1213,1.1481,0,2.7717,0.7654,0,1.8478,1.4142,0,1.4142],
// 4 16 1.1481 0 2.7717 0 0 3 0 0 2 0.7654 0 1.8478
  [4,16,1.1481,0,2.7717,0,0,3,0,0,2,0.7654,0,1.8478],
// 4 16 0 0 3 -1.1481 0 2.7717 -0.7654 0 1.8478 0 0 2
  [4,16,0,0,3,-1.1481,0,2.7717,-0.7654,0,1.8478,0,0,2],
// 4 16 -1.1481 0 2.7717 -2.1213 0 2.1213 -1.4142 0 1.4142 -0.7654 0 1.8478
  [4,16,-1.1481,0,2.7717,-2.1213,0,2.1213,-1.4142,0,1.4142,-0.7654,0,1.8478],
// 4 16 -2.1213 0 2.1213 -2.7717 0 1.1481 -1.8478 0 0.7654 -1.4142 0 1.4142
  [4,16,-2.1213,0,2.1213,-2.7717,0,1.1481,-1.8478,0,0.7654,-1.4142,0,1.4142],
// 4 16 -2.7717 0 1.1481 -3 0 0 -2 0 0 -1.8478 0 0.7654
  [4,16,-2.7717,0,1.1481,-3,0,0,-2,0,0,-1.8478,0,0.7654],
];
module ldraw_lib__2_4ring2(step=0, col=false, unit=2/5, alt=false, line=0.2, solid=!$preview)
    makepoly(ldraw_lib__2_4ring2(), step=step, col=col, unit=unit, alt=alt, line=line, solid=solid);
ldraw_lib__2_4ring2(line=0.2);
// file: ../p/2-4ndis.scad
use <../lib.scad>
function ldraw_lib__2_4ndis() = [
// 0 Disc Negative 0.5
// 0 Name: 2-4ndis.dat
// 0 Author: James Jessiman
// 0 !LDRAW_ORG Primitive UPDATE 2012-01
// 0 !LICENSE Licensed under CC BY 4.0 : see CAreadme.txt
// 
// 0 BFC CERTIFY CCW
  [0,"BFC","CERTIFY"],
  [0,"BFC","CCW"],
// 
// 0 !HISTORY 2002-03-23 [sbliss] Added BFC statement; compacted code
// 0 !HISTORY 2002-04-25 [PTadmin] Official Update 2002-02
// 0 !HISTORY 2007-06-24 [PTadmin] Header formatted for Contributor Agreement
// 0 !HISTORY 2008-07-01 [PTadmin] Official Update 2008-01
// 0 !HISTORY 2012-02-16 [Philo] Changed to CCW
// 0 !HISTORY 2012-03-30 [PTadmin] Official Update 2012-01
// 
// 
// 3 16 0.9239 0 0.3827 1 0 0 1 0 1
  [3,16,0.9239,0,0.3827,1,0,0,1,0,1],
// 3 16 0.7071 0 0.7071 0.9239 0 0.3827 1 0 1
  [3,16,0.7071,0,0.7071,0.9239,0,0.3827,1,0,1],
// 3 16 0.3827 0 0.9239 0.7071 0 0.7071 1 0 1
  [3,16,0.3827,0,0.9239,0.7071,0,0.7071,1,0,1],
// 3 16 0 0 1 0.3827 0 0.9239 1 0 1
  [3,16,0,0,1,0.3827,0,0.9239,1,0,1],
// 3 16 -0.3827 0 0.9239 0 0 1 -1 0 1
  [3,16,-0.3827,0,0.9239,0,0,1,-1,0,1],
// 3 16 -0.7071 0 0.7071 -0.3827 0 0.9239 -1 0 1
  [3,16,-0.7071,0,0.7071,-0.3827,0,0.9239,-1,0,1],
// 3 16 -0.9239 0 0.3827 -0.7071 0 0.7071 -1 0 1
  [3,16,-0.9239,0,0.3827,-0.7071,0,0.7071,-1,0,1],
// 3 16 -1 0 0 -0.9239 0 0.3827 -1 0 1
  [3,16,-1,0,0,-0.9239,0,0.3827,-1,0,1],
];
module ldraw_lib__2_4ndis(step=0, col=false, unit=2/5, alt=false, line=0.2, solid=!$preview)
    makepoly(ldraw_lib__2_4ndis(), step=step, col=col, unit=unit, alt=alt, line=line, solid=solid);
ldraw_lib__2_4ndis(line=0.2);
// file: ../p/2-4chrd.scad
use <../lib.scad>
$fa=1; $fs=0.2;
function ldraw_lib__2_4chrd(realsolid=false) = [
// 0 Chord 0.5
// 0 Name: 2-4chrd.dat
// 0 Author: Philippe Hurbain [Philo]
// 0 !LDRAW_ORG Primitive UPDATE 2014-01
// 0 !LICENSE Licensed under CC BY 2.0 and CC BY 4.0 : see CAreadme.txt
// 
// 0 BFC CERTIFY CCW
  [0,"BFC","CERTIFY"],
  [0,"BFC","CCW"],
// 
// 0 !HISTORY 2014-06-21 [PTadmin] Official Update 2014-01
// 
// 
// 4 16 0.9239 0 0.3827 -0.9239 0 0.3827 -1 0 0 1 0 0
  [4,16,0.9239,0,0.3827,-0.9239,0,0.3827,-1,0,0,1,0,0],
// 4 16 0.7071 0 0.7071 -0.7071 0 0.7071 -0.9239 0 0.3827 0.9239 0 0.3827
  [4,16,0.7071,0,0.7071,-0.7071,0,0.7071,-0.9239,0,0.3827,0.9239,0,0.3827],
// 4 16 0.3827 0 0.9239 -0.3827 0 0.9239 -0.7071 0 0.7071 0.7071 0 0.7071
  [4,16,0.3827,0,0.9239,-0.3827,0,0.9239,-0.7071,0,0.7071,0.7071,0,0.7071],
// 3 16 0 0 1 -0.3827 0 0.9239 0.3827 0 0.9239
  [3,16,0,0,1,-0.3827,0,0.9239,0.3827,0,0.9239],
];
module ldraw_lib__2_4chrd(step=0, col=false, unit=2/5, alt=false, line=0.2, solid=!$preview)
    makepoly(ldraw_lib__2_4chrd(solid), step=step, col=col, unit=unit, alt=alt, line=line, solid=solid);
ldraw_lib__2_4chrd(line=0.2);
// main file
use <../lib.scad>
use <../p/2-4chrd.scad>
use <../p/2-4ndis.scad>
use <../p/2-4ring2.scad>
use <../p/2-4ring5.scad>
use <s/3004s01.scad>
function ldraw_lib__3004p0i() = [
// 0 Brick  1 x  2 with Black and Light Bluish Grey Castle Windows Pattern
// 0 Name: 3004p0i.dat
// 0 Author: Philippe Hurbain [Philo]
// 0 !LDRAW_ORG Part UPDATE 2026-03
// 0 !LICENSE Licensed under CC BY 4.0 : see CAreadme.txt
// 
// 0 BFC CERTIFY CCW
  [0,"BFC","CERTIFY"],
  [0,"BFC","CCW"],
// 
// 0 !KEYWORDS Architecture, Bricklink 3004pb341, Brickowl 989032, Brickset 113284
// 0 !KEYWORDS Neuschwanstein Castle, Rebrickable 3004pr0120, Set 21063
// 
// 0 !HISTORY 2026-03-31 [OrionP] Official Update 2026-03
// 
// 1 16 0 0 0 1 0 0 0 1 0 0 0 1 s\3004s01.dat
  [1,16,0,0,0,1,0,0,0,1,0,0,0,1, ldraw_lib__s__3004s01()],
// 
// 1 71 0 8 -10 -.684 0 0 0 0 -.684 0 1 0 2-4ring5.dat
  [1,71,0,8,-10,-.684,0,0,0,0,-.684,0,1,0, ldraw_lib__2_4ring5()],
// 1 16 0 8 -10 -1.14 0 0 0 0 -1.14 0 1 0 2-4ring2.dat
  [1,16,0,8,-10,-1.14,0,0,0,0,-1.14,0,1,0, ldraw_lib__2_4ring2()],
// 1 71 0 8 -10 -.76 0 0 0 0 -.76 0 1 0 2-4ring2.dat
  [1,71,0,8,-10,-.76,0,0,0,0,-.76,0,1,0, ldraw_lib__2_4ring2()],
// 1 0 0 8 -10 -1.52 0 0 0 0 -1.52 0 1 0 2-4chrd.dat
  [1,0,0,8,-10,-1.52,0,0,0,0,-1.52,0,1,0, ldraw_lib__2_4chrd()],
// 4 16 3.42 18.5 -10 3.42 8 -10 2.28 8 -10 2.28 18.5 -10
  [4,16,3.42,18.5,-10,3.42,8,-10,2.28,8,-10,2.28,18.5,-10],
// 4 16 -2.28 18.5 -10 -2.28 8 -10 -3.42 8 -10 -3.42 18.5 -10
  [4,16,-2.28,18.5,-10,-2.28,8,-10,-3.42,8,-10,-3.42,18.5,-10],
// 4 0 1.52 8 -10 -1.52 8 -10 -1.52 18.5 -10 1.52 18.5 -10
  [4,0,1.52,8,-10,-1.52,8,-10,-1.52,18.5,-10,1.52,18.5,-10],
// 4 71 1.52 18.5 -10 2.28 18.5 -10 2.28 8 -10 1.52 8 -10
  [4,71,1.52,18.5,-10,2.28,18.5,-10,2.28,8,-10,1.52,8,-10],
// 4 71 -2.28 18.5 -10 -1.52 18.5 -10 -1.52 8 -10 -2.28 8 -10
  [4,71,-2.28,18.5,-10,-1.52,18.5,-10,-1.52,8,-10,-2.28,8,-10],
// 4 71 -4.104 19.2 -10 -3.42 18.5 -10 -3.42 8 -10 -4.104 8 -10
  [4,71,-4.104,19.2,-10,-3.42,18.5,-10,-3.42,8,-10,-4.104,8,-10],
// 3 71 -4.104 19.2 -10 -2.28 18.5 -10 -3.42 18.5 -10
  [3,71,-4.104,19.2,-10,-2.28,18.5,-10,-3.42,18.5,-10],
// 3 71 -4.104 19.2 -10 -1.52 18.5 -10 -2.28 18.5 -10
  [3,71,-4.104,19.2,-10,-1.52,18.5,-10,-2.28,18.5,-10],
// 4 71 1.52 18.5 -10 -1.52 18.5 -10 -4.104 19.2 -10 4.104 19.2 -10
  [4,71,1.52,18.5,-10,-1.52,18.5,-10,-4.104,19.2,-10,4.104,19.2,-10],
// 3 71 4.104 19.2 -10 2.28 18.5 -10 1.52 18.5 -10
  [3,71,4.104,19.2,-10,2.28,18.5,-10,1.52,18.5,-10],
// 3 71 4.104 19.2 -10 3.42 18.5 -10 2.28 18.5 -10
  [3,71,4.104,19.2,-10,3.42,18.5,-10,2.28,18.5,-10],
// 4 71 4.104 8 -10 3.42 8 -10 3.42 18.5 -10 4.104 19.2 -10
  [4,71,4.104,8,-10,3.42,8,-10,3.42,18.5,-10,4.104,19.2,-10],
// 1 16 0 8 -10 -4.104 0 0 0 0 -4.104 0 1 0 2-4ndis.dat
  [1,16,0,8,-10,-4.104,0,0,0,0,-4.104,0,1,0, ldraw_lib__2_4ndis()],
// 3 16 -4.104 3.896 -10 0 3.896 -10 -20 0 -10
  [3,16,-4.104,3.896,-10,0,3.896,-10,-20,0,-10],
// 4 16 -20 24 -10 -4.104 8 -10 -4.104 3.896 -10 -20 0 -10
  [4,16,-20,24,-10,-4.104,8,-10,-4.104,3.896,-10,-20,0,-10],
// 3 16 -4.104 19.2 -10 -4.104 8 -10 -20 24 -10
  [3,16,-4.104,19.2,-10,-4.104,8,-10,-20,24,-10],
// 4 16 -20 0 -10 0 3.896 -10 4.104 3.896 -10 20 0 -10
  [4,16,-20,0,-10,0,3.896,-10,4.104,3.896,-10,20,0,-10],
// 4 16 4.104 3.896 -10 4.104 8 -10 20 24 -10 20 0 -10
  [4,16,4.104,3.896,-10,4.104,8,-10,20,24,-10,20,0,-10],
// 3 16 20 24 -10 4.104 8 -10 4.104 19.2 -10
  [3,16,20,24,-10,4.104,8,-10,4.104,19.2,-10],
// 4 16 20 24 -10 4.104 19.2 -10 -4.104 19.2 -10 -20 24 -10
  [4,16,20,24,-10,4.104,19.2,-10,-4.104,19.2,-10,-20,24,-10],
];
module ldraw_lib__3004p0i(step=0, col=false, unit=2/5, alt=false, line=0.2, solid=!$preview)
    makepoly(ldraw_lib__3004p0i(), step=step, col=col, unit=unit, alt=alt, line=line, solid=solid);
ldraw_lib__3004p0i(line=0.2);
